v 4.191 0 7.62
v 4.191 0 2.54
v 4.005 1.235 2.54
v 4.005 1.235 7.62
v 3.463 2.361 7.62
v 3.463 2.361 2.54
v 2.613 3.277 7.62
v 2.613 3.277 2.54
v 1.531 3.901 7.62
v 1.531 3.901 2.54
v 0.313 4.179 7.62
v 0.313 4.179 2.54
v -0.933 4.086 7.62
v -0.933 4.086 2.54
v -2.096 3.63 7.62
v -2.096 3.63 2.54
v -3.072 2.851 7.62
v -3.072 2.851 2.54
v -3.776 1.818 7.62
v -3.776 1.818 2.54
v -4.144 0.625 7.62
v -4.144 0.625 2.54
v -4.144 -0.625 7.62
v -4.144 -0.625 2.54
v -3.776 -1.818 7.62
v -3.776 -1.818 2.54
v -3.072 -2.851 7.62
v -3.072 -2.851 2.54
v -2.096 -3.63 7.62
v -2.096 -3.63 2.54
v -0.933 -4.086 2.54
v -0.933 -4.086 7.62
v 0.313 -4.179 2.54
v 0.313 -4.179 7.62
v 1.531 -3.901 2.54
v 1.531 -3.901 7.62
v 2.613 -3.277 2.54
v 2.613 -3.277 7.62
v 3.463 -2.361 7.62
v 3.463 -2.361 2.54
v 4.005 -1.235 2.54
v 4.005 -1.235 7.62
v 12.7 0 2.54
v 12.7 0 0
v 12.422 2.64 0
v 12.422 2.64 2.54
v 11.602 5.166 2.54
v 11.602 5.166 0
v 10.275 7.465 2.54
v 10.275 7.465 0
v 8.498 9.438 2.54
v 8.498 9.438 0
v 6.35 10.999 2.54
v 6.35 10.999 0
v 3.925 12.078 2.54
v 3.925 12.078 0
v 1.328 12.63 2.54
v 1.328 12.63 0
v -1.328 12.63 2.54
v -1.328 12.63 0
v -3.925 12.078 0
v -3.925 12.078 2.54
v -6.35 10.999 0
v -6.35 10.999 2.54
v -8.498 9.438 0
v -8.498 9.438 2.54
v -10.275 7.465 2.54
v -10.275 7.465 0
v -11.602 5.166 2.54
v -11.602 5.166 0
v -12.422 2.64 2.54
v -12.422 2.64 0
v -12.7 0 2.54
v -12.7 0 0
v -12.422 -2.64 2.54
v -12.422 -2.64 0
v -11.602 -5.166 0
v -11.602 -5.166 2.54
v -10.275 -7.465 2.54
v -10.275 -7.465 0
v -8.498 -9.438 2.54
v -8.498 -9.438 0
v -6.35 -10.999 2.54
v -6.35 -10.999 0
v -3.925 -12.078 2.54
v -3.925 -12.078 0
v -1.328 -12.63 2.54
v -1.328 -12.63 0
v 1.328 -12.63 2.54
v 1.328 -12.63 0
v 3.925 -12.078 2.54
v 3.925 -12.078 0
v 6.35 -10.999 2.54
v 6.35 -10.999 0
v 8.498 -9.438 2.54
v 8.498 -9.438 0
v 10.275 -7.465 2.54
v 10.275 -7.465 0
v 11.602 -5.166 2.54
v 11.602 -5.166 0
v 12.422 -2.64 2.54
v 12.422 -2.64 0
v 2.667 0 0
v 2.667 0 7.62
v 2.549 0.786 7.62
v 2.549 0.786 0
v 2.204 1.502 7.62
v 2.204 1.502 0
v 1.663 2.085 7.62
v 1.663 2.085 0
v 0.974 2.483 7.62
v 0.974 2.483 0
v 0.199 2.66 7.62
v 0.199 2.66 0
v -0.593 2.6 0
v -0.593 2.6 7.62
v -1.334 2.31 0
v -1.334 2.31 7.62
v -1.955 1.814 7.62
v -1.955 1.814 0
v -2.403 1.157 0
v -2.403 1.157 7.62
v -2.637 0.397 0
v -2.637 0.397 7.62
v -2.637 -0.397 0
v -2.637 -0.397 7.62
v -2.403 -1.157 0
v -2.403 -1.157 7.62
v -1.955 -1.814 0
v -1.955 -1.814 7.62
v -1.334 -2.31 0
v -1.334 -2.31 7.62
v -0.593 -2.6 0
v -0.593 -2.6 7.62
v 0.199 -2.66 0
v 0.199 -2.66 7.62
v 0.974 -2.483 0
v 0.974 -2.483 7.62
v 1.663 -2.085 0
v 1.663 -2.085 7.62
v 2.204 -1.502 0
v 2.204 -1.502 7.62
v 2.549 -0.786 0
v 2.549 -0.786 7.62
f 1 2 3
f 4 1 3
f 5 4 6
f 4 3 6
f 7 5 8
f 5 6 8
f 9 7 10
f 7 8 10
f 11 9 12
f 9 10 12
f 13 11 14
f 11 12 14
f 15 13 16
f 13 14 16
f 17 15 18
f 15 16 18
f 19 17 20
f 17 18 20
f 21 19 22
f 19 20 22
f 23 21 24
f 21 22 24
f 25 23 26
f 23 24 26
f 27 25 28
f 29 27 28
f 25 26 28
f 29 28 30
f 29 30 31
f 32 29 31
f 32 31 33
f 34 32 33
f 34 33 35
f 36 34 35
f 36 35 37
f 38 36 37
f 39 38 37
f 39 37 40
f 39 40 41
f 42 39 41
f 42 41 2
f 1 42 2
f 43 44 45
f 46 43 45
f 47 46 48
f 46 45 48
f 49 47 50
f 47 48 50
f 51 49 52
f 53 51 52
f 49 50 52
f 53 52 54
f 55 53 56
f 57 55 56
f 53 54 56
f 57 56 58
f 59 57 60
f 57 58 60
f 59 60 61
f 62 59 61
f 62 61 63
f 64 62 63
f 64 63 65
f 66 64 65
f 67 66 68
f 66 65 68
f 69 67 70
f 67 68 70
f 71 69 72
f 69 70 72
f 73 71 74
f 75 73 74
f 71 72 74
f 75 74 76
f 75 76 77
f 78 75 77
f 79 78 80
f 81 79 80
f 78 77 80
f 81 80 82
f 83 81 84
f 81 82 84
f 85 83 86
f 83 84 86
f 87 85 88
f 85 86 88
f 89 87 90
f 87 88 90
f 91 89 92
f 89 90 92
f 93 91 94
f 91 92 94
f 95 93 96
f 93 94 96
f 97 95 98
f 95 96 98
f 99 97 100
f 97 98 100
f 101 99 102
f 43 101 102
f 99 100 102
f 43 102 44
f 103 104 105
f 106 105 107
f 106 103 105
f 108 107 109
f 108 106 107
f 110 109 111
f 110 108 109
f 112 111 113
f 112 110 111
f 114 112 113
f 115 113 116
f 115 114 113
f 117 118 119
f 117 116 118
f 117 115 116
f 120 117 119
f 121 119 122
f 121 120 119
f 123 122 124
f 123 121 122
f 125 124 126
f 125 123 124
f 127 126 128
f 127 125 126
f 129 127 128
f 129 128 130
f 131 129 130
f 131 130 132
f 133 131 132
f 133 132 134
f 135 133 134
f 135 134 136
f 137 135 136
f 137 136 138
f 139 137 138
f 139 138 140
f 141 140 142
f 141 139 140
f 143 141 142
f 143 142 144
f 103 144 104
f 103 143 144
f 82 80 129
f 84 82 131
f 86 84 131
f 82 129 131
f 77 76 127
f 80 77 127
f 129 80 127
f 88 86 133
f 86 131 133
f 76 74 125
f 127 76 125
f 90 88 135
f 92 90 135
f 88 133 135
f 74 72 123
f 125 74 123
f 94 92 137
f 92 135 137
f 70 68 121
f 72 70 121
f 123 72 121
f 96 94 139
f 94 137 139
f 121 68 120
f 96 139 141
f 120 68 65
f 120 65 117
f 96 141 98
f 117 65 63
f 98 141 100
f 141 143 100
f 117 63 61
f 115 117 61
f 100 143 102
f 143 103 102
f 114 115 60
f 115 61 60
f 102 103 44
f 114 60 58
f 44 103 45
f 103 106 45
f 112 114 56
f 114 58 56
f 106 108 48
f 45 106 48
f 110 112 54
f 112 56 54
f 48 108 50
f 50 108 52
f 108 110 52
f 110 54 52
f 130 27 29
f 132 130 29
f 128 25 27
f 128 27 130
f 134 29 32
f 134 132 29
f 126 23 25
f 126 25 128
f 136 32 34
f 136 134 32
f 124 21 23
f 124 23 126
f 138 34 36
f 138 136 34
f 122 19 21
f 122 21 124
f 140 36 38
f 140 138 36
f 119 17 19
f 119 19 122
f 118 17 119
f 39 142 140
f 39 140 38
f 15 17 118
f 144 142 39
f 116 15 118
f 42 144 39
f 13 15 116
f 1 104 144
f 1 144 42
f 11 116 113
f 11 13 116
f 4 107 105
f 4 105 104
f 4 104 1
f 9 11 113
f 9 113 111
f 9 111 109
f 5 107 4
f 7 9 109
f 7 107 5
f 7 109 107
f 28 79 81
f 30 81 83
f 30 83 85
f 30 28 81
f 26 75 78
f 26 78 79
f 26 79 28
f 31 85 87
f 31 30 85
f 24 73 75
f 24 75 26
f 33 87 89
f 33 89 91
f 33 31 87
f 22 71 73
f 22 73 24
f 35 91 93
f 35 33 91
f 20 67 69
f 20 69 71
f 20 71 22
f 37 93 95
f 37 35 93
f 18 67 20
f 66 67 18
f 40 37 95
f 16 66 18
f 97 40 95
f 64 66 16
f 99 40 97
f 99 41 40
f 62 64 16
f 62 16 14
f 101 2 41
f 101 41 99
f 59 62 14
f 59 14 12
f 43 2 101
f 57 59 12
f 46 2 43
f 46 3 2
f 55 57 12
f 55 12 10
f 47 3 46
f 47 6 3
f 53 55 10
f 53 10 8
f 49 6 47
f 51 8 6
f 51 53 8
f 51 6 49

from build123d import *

# Parameters (mm, degrees)
F0_R     = 12.7
F1_DEPTH = 2.54
F2_R     = 4.191
F3_DEPTH = 7.62
F4_R     = 2.667
F5_DEPTH = 7.621


with BuildPart() as f1:
    # F0 (on Top) → F1 (new body)
    with BuildSketch(Plane.XY):
        Circle(F0_R)
    extrude(amount=F1_DEPTH)

    # F2 (on Top) → F3 (join)
    with BuildSketch(Plane.XY):
        Circle(F2_R)
    extrude(amount=F3_DEPTH)

    # F4 (on Top) → F5 (cut, through all)
    with BuildSketch(Plane.XY):
        Circle(F4_R)
    extrude(amount=F5_DEPTH, mode=Mode.SUBTRACT)


solid = f1.part
